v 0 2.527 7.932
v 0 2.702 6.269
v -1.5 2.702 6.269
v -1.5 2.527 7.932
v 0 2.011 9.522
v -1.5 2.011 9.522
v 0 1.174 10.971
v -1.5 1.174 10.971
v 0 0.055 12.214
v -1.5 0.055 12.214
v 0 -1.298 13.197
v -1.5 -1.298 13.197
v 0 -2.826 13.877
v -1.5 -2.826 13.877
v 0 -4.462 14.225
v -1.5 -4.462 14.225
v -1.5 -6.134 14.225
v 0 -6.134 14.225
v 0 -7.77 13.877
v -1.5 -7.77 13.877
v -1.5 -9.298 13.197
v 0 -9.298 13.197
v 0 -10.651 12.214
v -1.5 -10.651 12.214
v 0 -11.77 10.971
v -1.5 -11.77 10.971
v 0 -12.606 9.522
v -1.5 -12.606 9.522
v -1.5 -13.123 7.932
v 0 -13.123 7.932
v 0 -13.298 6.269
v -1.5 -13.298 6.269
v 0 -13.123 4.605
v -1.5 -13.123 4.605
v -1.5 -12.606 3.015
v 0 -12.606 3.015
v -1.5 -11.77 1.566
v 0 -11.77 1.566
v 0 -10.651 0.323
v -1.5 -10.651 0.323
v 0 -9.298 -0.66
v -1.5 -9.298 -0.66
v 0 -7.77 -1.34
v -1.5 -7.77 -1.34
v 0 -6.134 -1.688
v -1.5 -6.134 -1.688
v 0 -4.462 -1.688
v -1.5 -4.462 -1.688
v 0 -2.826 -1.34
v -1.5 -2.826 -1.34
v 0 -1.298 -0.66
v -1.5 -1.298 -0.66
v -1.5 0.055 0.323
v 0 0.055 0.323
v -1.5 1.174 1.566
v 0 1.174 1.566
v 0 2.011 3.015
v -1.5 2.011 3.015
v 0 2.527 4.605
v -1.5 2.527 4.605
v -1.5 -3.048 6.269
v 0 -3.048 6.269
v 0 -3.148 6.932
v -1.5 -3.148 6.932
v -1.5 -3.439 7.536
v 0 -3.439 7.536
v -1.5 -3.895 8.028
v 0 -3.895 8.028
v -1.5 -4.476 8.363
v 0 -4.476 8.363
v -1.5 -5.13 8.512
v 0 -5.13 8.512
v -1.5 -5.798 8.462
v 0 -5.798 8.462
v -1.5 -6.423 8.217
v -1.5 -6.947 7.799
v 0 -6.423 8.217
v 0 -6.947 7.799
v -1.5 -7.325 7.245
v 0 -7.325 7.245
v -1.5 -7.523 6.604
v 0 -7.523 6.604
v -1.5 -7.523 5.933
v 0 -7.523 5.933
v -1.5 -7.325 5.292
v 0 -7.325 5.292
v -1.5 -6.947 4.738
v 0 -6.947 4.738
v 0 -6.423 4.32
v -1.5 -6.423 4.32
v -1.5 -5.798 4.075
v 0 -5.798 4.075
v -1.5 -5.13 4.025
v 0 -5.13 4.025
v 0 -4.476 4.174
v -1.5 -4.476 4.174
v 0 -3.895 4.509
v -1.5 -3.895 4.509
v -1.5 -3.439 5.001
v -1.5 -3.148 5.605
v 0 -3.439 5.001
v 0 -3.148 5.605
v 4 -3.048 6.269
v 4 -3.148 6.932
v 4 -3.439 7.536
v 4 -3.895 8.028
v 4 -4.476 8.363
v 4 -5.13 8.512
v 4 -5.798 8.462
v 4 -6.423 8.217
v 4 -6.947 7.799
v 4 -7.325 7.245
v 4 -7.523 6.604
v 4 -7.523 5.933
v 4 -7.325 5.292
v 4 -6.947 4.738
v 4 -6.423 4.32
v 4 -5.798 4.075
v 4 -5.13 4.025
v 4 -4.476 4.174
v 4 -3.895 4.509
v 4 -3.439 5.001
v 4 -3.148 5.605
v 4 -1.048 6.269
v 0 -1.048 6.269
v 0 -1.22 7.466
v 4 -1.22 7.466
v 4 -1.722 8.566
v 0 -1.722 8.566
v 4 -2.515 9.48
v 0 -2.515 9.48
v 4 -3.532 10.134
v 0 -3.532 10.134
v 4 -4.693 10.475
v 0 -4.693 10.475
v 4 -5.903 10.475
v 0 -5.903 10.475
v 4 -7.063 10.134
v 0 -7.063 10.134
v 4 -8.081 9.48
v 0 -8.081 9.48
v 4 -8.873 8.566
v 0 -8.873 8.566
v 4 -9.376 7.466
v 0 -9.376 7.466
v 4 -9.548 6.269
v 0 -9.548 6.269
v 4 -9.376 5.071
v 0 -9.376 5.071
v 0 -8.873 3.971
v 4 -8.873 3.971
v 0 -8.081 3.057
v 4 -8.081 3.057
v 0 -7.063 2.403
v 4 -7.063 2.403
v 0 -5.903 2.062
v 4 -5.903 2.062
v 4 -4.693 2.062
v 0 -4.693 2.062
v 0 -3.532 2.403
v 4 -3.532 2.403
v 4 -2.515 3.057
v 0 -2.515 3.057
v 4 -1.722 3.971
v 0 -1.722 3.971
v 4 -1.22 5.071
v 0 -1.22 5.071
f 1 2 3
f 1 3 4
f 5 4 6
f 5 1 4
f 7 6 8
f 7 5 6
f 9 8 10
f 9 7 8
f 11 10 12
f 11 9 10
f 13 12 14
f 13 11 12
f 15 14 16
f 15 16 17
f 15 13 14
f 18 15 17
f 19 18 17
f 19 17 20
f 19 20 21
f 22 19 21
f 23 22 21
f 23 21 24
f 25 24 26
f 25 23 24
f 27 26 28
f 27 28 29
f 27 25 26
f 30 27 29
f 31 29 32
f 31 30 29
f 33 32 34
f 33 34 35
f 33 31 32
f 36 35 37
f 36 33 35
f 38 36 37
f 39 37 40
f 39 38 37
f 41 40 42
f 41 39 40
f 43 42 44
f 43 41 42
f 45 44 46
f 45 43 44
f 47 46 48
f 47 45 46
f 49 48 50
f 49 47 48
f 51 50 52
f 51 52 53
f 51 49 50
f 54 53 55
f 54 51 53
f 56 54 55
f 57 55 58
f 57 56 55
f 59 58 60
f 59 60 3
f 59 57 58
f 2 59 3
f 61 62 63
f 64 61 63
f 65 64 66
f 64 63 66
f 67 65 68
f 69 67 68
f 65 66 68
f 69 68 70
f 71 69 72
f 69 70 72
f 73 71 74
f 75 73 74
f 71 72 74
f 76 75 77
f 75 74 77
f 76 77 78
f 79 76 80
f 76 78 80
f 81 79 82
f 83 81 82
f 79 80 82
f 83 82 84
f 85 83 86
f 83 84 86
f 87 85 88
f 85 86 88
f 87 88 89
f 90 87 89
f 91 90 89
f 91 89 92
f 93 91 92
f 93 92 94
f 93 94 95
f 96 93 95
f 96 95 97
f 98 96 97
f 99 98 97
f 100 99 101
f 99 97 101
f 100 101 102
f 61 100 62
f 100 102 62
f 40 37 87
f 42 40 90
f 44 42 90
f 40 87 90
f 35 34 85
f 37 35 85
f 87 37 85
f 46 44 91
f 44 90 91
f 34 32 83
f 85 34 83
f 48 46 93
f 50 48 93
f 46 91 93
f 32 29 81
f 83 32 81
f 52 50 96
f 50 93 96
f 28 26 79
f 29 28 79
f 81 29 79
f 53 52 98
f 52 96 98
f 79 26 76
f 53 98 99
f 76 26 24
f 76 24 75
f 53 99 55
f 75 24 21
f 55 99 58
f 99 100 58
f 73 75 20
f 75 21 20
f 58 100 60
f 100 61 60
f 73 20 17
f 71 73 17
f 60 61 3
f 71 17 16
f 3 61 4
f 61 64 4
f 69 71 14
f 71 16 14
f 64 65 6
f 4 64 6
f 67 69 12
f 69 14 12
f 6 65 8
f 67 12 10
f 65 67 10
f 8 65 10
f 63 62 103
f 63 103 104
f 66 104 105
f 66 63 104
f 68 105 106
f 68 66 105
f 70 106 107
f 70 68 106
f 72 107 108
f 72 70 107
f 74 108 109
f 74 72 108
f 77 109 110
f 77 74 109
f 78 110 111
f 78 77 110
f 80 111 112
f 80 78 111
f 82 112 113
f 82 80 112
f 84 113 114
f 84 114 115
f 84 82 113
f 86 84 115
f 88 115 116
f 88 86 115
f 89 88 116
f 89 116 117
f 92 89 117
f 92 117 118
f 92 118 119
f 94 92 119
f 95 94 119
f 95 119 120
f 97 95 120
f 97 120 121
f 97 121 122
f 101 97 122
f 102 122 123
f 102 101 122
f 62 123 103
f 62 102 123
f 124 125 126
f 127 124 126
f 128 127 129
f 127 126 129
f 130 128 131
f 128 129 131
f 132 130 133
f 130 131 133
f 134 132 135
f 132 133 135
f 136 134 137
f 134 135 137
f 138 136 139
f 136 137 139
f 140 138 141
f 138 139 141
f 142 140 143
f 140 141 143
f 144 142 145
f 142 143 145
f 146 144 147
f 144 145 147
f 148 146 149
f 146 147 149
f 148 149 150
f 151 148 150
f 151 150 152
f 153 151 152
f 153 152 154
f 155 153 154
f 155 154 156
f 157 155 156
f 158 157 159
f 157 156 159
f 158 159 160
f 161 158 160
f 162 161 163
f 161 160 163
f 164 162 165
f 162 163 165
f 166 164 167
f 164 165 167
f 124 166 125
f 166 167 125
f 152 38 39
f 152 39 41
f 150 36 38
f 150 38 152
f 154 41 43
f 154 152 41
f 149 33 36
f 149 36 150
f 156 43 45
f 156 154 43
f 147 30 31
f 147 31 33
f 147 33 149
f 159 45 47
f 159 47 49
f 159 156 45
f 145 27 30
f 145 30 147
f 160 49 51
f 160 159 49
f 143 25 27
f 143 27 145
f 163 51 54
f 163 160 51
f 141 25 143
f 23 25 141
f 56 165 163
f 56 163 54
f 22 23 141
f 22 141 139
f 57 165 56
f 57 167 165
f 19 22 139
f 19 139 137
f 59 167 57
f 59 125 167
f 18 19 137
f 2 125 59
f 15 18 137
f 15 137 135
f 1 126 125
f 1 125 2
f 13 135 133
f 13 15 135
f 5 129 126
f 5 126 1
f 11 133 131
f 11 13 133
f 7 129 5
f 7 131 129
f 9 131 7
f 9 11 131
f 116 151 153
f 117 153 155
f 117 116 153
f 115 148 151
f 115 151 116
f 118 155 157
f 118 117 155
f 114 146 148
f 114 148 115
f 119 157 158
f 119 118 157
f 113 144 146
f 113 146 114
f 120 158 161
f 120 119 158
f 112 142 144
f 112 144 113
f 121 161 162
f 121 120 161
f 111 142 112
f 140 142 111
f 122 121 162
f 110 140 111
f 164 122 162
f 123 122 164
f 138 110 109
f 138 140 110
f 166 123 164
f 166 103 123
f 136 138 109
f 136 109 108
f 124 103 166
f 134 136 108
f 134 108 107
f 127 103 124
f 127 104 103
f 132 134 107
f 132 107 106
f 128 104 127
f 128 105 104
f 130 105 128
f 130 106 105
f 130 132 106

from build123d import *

# Parameters (mm, degrees)
F0_R     = 4.25
F0_R_2   = 2.25
F1_DEPTH = 4
F0_R_3   = 8
F0_R_4   = 5
F2_DEPTH = 1.5


with BuildPart() as f1:
    # F0 (on Right) → F1 (new body)
    with BuildSketch(Plane.YZ):
        with Locations((-5.2978091688, 6.2685288617)):
            Circle(F0_R)
        with Locations((-5.2978091688, 6.2685288617)):
            Circle(F0_R_2, mode=Mode.SUBTRACT)
    extrude(amount=F1_DEPTH)

    # F0 (on Right) → F2 (join)
    with BuildSketch(Plane.YZ):
        with Locations((-5.2978091688, 6.2685288617)):
            Circle(F0_R_3)
        with Locations((-5.2978091688, 6.2685288617)):
            Circle(F0_R_4, mode=Mode.SUBTRACT)
        with Locations((-5.2978091688, 6.2685288617)):
            Circle(F0_R_4)
        with Locations((-5.2978091688, 6.2685288617)):
            Circle(F0_R, mode=Mode.SUBTRACT)
        with Locations((-5.2978091688, 6.2685288617)):
            Circle(F0_R)
        with Locations((-5.2978091688, 6.2685288617)):
            Circle(F0_R_2, mode=Mode.SUBTRACT)
    extrude(amount=-F2_DEPTH)


solid = f1.part
